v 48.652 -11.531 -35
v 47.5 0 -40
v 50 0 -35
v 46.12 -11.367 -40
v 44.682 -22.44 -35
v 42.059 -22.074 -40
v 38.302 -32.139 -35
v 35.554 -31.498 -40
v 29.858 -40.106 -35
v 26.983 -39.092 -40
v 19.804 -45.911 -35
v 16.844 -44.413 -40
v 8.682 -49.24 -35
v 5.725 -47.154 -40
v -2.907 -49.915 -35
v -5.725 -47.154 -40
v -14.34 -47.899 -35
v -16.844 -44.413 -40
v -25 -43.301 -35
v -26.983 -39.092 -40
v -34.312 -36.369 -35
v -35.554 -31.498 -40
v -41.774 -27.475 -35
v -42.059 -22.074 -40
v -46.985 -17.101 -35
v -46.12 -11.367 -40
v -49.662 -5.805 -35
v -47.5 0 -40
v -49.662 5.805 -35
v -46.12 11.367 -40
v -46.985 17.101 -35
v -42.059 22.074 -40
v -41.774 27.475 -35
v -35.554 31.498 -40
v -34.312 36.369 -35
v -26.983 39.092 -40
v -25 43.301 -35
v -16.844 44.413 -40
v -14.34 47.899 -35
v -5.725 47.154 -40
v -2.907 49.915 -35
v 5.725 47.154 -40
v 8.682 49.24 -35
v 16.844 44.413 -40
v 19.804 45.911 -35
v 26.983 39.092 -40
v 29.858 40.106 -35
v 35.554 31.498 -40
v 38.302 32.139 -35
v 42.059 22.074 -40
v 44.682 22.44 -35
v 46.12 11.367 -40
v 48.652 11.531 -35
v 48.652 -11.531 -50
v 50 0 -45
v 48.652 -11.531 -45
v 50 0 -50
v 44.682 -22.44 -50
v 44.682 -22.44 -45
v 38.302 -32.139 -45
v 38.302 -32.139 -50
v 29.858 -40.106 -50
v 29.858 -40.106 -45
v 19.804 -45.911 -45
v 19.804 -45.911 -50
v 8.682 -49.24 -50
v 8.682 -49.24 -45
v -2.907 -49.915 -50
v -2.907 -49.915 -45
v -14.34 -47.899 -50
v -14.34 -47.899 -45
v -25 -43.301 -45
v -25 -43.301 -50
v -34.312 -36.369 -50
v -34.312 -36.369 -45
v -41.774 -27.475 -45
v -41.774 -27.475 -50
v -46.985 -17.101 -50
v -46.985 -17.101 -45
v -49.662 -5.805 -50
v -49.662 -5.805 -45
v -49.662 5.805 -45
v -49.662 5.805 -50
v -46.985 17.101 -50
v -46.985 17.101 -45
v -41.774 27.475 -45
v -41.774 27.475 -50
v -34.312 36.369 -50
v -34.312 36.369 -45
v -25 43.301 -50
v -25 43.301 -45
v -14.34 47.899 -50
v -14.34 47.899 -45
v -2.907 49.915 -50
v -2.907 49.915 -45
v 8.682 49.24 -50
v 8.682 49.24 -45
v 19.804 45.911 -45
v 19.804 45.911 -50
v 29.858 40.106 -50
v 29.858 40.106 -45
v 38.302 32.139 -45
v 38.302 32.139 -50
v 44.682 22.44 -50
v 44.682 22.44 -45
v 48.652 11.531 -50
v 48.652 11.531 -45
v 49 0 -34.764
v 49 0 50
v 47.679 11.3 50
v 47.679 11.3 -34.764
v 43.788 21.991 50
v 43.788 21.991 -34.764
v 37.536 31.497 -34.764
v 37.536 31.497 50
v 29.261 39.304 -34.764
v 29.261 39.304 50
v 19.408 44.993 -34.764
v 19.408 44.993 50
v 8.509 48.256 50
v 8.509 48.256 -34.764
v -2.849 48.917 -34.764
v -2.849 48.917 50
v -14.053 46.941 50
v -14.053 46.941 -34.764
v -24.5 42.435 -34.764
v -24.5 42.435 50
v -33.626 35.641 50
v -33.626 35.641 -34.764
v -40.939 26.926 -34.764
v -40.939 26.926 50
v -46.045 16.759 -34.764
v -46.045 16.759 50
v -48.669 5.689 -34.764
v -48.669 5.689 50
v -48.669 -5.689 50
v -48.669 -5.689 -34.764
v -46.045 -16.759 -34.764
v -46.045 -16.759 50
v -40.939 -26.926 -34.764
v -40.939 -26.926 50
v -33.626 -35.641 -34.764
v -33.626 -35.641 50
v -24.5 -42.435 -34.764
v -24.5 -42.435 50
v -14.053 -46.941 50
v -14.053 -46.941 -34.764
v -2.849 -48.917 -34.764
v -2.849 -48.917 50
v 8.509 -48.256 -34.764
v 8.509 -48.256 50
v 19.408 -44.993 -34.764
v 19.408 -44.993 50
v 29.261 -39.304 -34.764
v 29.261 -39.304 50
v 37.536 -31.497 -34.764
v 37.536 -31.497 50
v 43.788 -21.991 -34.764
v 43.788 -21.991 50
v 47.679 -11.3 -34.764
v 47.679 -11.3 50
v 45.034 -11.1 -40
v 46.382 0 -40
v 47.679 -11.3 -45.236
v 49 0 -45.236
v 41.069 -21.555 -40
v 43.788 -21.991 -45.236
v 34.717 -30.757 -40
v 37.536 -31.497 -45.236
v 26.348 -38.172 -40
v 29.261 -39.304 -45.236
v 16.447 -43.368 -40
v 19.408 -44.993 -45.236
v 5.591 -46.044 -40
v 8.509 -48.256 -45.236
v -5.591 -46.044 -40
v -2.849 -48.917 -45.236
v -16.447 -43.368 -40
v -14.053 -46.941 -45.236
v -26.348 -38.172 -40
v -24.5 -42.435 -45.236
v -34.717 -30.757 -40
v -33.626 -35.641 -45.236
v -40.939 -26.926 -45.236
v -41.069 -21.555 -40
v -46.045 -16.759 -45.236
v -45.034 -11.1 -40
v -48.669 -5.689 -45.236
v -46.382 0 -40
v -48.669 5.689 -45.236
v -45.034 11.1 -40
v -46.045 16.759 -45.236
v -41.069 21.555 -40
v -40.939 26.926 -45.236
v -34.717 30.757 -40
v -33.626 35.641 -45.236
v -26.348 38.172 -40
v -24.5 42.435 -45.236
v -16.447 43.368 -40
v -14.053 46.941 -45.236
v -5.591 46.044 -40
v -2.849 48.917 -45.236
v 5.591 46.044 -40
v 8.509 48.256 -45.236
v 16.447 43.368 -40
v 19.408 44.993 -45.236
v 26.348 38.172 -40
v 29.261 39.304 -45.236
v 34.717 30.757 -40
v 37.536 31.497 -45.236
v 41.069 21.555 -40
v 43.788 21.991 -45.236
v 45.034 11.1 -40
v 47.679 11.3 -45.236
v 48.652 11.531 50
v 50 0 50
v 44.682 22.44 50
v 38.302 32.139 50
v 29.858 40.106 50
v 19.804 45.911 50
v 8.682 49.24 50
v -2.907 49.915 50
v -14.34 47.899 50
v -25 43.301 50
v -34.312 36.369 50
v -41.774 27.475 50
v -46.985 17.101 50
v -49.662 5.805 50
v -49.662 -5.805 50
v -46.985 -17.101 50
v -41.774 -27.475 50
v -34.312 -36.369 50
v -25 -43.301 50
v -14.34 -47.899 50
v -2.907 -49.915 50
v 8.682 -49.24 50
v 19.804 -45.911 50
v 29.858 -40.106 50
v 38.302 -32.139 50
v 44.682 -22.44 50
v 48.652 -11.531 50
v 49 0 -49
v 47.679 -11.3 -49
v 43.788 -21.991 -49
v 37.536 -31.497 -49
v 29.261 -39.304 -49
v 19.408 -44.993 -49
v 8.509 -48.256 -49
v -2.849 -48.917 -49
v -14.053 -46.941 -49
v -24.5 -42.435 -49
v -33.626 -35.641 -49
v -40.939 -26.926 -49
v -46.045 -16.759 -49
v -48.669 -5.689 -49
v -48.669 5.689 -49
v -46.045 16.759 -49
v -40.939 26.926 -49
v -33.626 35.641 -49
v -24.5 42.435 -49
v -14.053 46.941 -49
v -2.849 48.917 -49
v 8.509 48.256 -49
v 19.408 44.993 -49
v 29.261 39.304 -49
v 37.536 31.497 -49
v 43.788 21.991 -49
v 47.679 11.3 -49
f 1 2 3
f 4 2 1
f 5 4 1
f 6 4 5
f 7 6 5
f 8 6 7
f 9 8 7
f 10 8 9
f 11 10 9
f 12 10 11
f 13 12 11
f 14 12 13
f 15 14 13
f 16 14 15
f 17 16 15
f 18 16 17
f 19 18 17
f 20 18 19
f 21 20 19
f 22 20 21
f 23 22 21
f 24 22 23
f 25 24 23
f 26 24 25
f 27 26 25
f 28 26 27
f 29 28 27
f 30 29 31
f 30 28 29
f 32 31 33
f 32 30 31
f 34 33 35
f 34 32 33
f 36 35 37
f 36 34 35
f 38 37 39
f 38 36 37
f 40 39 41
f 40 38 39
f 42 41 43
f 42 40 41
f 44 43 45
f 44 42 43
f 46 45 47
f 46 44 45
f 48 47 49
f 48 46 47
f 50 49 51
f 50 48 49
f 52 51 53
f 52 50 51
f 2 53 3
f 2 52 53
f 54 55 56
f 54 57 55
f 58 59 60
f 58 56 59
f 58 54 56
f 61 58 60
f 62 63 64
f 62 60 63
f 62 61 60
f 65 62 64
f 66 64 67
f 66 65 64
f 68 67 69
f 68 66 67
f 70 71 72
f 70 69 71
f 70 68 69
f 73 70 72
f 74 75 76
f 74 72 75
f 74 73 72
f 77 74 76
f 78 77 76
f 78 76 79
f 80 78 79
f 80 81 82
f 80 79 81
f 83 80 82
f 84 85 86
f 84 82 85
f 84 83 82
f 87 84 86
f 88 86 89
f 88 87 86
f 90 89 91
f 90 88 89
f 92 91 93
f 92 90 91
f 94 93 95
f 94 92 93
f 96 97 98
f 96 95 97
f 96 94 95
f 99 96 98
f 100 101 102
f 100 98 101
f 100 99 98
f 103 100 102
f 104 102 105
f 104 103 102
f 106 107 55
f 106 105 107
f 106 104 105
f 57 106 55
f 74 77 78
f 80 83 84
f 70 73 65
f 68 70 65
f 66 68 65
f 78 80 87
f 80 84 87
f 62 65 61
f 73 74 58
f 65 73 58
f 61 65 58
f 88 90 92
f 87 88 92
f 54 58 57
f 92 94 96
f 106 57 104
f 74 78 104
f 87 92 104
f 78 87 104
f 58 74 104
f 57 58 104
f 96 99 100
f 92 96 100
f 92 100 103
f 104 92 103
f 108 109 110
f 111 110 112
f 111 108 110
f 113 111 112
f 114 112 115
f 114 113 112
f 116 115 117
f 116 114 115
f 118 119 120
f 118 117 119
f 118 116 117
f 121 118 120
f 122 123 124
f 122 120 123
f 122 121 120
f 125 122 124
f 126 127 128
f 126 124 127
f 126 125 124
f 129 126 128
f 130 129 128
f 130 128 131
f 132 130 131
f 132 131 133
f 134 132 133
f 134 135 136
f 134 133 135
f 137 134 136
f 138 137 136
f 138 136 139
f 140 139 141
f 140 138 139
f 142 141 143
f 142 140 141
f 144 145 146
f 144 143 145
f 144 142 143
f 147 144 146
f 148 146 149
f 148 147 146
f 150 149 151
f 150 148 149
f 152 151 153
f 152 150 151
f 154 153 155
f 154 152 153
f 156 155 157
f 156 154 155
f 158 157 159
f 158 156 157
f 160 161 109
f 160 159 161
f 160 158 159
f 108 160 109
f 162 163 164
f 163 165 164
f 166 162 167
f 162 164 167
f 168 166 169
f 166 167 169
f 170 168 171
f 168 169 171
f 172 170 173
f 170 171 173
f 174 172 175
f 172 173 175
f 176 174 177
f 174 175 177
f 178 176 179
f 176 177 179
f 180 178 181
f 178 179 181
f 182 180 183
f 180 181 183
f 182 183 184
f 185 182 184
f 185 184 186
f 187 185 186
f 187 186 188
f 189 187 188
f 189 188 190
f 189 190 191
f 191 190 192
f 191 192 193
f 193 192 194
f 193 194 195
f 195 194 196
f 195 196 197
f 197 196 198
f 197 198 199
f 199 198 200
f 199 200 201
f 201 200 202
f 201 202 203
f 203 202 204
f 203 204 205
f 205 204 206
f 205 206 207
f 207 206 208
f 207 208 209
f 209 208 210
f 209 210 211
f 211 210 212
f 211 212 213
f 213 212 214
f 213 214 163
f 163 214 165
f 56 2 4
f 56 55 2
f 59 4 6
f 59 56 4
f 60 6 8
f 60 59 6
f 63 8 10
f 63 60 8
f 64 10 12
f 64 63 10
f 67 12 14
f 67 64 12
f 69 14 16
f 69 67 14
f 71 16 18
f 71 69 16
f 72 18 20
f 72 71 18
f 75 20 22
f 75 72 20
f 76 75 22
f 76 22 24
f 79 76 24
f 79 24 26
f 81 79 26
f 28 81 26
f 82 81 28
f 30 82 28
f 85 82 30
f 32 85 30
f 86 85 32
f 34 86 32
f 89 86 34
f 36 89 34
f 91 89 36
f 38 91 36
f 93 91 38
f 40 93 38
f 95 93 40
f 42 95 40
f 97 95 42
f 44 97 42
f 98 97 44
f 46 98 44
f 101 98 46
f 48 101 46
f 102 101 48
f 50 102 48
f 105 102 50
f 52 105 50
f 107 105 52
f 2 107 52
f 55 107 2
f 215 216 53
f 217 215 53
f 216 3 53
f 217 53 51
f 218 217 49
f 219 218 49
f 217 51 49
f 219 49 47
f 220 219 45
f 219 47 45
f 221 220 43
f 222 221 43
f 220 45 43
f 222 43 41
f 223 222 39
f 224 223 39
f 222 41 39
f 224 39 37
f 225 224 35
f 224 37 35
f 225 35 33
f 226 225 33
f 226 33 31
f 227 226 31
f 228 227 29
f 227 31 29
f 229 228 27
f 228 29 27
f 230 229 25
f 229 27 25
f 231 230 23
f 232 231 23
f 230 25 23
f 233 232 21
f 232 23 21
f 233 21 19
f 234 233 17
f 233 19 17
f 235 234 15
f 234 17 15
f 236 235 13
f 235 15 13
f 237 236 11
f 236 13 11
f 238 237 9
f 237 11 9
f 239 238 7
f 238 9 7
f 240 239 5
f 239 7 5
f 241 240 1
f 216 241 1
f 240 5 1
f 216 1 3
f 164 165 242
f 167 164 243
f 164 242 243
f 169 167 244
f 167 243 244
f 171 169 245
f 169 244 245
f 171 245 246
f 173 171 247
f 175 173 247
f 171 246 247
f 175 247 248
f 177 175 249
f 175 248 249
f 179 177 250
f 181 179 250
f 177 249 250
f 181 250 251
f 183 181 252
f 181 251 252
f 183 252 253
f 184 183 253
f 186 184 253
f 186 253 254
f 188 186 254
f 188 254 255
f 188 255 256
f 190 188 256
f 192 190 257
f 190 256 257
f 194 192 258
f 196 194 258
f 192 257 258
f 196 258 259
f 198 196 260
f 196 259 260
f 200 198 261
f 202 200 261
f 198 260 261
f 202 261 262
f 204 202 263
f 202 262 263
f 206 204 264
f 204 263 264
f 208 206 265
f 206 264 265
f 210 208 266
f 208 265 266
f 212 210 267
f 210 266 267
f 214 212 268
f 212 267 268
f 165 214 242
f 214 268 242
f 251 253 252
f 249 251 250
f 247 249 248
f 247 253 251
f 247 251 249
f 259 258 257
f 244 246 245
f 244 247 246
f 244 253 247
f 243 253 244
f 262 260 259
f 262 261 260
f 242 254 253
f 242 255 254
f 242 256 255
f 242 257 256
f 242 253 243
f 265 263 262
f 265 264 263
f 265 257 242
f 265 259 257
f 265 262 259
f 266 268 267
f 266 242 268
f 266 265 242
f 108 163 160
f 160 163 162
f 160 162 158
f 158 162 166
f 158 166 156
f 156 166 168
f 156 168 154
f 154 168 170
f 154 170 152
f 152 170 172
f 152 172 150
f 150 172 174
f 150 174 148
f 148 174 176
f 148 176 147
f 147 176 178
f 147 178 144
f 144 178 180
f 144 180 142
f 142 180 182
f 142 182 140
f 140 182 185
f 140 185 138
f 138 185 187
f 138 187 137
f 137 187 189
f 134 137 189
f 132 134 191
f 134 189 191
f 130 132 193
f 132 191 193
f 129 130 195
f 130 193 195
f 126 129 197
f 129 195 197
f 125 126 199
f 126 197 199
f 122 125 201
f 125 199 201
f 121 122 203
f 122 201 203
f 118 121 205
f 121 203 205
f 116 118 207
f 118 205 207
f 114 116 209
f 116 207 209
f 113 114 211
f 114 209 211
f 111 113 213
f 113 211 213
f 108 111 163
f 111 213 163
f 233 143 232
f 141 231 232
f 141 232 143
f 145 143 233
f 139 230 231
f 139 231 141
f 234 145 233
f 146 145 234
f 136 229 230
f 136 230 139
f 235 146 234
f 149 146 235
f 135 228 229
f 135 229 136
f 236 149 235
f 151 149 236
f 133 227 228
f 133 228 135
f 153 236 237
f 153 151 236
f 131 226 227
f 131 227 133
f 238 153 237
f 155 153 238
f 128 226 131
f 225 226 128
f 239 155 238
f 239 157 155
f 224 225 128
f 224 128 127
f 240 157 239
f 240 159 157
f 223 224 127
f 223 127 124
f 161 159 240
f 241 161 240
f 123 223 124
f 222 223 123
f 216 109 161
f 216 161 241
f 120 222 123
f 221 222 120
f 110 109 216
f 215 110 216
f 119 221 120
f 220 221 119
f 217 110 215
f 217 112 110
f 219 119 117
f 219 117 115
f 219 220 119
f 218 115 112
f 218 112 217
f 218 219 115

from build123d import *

# Parameters (mm, degrees)
F5_R       = 50
F9_R       = 50
F10_FACE_R = 50
F8_R       = 47.5
F11_FACE_R = 47.5
F7_R       = 50
F12_FACE_R = 50
F6_R       = 50
F14_T      = -1


with BuildPart() as f10:
    # F5 (on offset) → F10 section 0
    with BuildSketch(Plane.XY.offset(50)):
        Circle(F5_R)
    # F9 (on offset) → F10 section 1
    with BuildSketch(Plane.XY.offset(-35)):
        Circle(F9_R)
    loft()

    # F10_face (on face) → F11 section 0
    with BuildSketch(Plane(origin=(0, 0, -35), x_dir=(1, 0, 0), z_dir=(0, 0, -1))):
        Circle(F10_FACE_R)
    # F8 (on offset) → F11 section 1
    with BuildSketch(Plane.XY.offset(-40)):
        Circle(F8_R)
    loft()

    # F11_face (on face) → F12 section 0
    with BuildSketch(Plane(origin=(0, 0, -40), x_dir=(1, 0, 0), z_dir=(0, 0, -1))):
        Circle(F11_FACE_R)
    # F7 (on offset) → F12 section 1
    with BuildSketch(Plane.XY.offset(-45)):
        Circle(F7_R)
    loft()

    # F12_face (on face) → F13 section 0
    with BuildSketch(Plane(origin=(0, 0, -45), x_dir=(1, 0, 0), z_dir=(0, 0, -1))):
        Circle(F12_FACE_R)
    # F6 (on offset) → F13 section 1
    with BuildSketch(Plane.XY.offset(-50)):
        Circle(F6_R)
    loft()

    # F14
    f14_openings = [f10.faces().sort_by_distance(p)[0] for p in [
        (0, 0, 50),
    ]]
    offset(amount=F14_T, openings=f14_openings, kind=Kind.INTERSECTION)


solid = f10.part
